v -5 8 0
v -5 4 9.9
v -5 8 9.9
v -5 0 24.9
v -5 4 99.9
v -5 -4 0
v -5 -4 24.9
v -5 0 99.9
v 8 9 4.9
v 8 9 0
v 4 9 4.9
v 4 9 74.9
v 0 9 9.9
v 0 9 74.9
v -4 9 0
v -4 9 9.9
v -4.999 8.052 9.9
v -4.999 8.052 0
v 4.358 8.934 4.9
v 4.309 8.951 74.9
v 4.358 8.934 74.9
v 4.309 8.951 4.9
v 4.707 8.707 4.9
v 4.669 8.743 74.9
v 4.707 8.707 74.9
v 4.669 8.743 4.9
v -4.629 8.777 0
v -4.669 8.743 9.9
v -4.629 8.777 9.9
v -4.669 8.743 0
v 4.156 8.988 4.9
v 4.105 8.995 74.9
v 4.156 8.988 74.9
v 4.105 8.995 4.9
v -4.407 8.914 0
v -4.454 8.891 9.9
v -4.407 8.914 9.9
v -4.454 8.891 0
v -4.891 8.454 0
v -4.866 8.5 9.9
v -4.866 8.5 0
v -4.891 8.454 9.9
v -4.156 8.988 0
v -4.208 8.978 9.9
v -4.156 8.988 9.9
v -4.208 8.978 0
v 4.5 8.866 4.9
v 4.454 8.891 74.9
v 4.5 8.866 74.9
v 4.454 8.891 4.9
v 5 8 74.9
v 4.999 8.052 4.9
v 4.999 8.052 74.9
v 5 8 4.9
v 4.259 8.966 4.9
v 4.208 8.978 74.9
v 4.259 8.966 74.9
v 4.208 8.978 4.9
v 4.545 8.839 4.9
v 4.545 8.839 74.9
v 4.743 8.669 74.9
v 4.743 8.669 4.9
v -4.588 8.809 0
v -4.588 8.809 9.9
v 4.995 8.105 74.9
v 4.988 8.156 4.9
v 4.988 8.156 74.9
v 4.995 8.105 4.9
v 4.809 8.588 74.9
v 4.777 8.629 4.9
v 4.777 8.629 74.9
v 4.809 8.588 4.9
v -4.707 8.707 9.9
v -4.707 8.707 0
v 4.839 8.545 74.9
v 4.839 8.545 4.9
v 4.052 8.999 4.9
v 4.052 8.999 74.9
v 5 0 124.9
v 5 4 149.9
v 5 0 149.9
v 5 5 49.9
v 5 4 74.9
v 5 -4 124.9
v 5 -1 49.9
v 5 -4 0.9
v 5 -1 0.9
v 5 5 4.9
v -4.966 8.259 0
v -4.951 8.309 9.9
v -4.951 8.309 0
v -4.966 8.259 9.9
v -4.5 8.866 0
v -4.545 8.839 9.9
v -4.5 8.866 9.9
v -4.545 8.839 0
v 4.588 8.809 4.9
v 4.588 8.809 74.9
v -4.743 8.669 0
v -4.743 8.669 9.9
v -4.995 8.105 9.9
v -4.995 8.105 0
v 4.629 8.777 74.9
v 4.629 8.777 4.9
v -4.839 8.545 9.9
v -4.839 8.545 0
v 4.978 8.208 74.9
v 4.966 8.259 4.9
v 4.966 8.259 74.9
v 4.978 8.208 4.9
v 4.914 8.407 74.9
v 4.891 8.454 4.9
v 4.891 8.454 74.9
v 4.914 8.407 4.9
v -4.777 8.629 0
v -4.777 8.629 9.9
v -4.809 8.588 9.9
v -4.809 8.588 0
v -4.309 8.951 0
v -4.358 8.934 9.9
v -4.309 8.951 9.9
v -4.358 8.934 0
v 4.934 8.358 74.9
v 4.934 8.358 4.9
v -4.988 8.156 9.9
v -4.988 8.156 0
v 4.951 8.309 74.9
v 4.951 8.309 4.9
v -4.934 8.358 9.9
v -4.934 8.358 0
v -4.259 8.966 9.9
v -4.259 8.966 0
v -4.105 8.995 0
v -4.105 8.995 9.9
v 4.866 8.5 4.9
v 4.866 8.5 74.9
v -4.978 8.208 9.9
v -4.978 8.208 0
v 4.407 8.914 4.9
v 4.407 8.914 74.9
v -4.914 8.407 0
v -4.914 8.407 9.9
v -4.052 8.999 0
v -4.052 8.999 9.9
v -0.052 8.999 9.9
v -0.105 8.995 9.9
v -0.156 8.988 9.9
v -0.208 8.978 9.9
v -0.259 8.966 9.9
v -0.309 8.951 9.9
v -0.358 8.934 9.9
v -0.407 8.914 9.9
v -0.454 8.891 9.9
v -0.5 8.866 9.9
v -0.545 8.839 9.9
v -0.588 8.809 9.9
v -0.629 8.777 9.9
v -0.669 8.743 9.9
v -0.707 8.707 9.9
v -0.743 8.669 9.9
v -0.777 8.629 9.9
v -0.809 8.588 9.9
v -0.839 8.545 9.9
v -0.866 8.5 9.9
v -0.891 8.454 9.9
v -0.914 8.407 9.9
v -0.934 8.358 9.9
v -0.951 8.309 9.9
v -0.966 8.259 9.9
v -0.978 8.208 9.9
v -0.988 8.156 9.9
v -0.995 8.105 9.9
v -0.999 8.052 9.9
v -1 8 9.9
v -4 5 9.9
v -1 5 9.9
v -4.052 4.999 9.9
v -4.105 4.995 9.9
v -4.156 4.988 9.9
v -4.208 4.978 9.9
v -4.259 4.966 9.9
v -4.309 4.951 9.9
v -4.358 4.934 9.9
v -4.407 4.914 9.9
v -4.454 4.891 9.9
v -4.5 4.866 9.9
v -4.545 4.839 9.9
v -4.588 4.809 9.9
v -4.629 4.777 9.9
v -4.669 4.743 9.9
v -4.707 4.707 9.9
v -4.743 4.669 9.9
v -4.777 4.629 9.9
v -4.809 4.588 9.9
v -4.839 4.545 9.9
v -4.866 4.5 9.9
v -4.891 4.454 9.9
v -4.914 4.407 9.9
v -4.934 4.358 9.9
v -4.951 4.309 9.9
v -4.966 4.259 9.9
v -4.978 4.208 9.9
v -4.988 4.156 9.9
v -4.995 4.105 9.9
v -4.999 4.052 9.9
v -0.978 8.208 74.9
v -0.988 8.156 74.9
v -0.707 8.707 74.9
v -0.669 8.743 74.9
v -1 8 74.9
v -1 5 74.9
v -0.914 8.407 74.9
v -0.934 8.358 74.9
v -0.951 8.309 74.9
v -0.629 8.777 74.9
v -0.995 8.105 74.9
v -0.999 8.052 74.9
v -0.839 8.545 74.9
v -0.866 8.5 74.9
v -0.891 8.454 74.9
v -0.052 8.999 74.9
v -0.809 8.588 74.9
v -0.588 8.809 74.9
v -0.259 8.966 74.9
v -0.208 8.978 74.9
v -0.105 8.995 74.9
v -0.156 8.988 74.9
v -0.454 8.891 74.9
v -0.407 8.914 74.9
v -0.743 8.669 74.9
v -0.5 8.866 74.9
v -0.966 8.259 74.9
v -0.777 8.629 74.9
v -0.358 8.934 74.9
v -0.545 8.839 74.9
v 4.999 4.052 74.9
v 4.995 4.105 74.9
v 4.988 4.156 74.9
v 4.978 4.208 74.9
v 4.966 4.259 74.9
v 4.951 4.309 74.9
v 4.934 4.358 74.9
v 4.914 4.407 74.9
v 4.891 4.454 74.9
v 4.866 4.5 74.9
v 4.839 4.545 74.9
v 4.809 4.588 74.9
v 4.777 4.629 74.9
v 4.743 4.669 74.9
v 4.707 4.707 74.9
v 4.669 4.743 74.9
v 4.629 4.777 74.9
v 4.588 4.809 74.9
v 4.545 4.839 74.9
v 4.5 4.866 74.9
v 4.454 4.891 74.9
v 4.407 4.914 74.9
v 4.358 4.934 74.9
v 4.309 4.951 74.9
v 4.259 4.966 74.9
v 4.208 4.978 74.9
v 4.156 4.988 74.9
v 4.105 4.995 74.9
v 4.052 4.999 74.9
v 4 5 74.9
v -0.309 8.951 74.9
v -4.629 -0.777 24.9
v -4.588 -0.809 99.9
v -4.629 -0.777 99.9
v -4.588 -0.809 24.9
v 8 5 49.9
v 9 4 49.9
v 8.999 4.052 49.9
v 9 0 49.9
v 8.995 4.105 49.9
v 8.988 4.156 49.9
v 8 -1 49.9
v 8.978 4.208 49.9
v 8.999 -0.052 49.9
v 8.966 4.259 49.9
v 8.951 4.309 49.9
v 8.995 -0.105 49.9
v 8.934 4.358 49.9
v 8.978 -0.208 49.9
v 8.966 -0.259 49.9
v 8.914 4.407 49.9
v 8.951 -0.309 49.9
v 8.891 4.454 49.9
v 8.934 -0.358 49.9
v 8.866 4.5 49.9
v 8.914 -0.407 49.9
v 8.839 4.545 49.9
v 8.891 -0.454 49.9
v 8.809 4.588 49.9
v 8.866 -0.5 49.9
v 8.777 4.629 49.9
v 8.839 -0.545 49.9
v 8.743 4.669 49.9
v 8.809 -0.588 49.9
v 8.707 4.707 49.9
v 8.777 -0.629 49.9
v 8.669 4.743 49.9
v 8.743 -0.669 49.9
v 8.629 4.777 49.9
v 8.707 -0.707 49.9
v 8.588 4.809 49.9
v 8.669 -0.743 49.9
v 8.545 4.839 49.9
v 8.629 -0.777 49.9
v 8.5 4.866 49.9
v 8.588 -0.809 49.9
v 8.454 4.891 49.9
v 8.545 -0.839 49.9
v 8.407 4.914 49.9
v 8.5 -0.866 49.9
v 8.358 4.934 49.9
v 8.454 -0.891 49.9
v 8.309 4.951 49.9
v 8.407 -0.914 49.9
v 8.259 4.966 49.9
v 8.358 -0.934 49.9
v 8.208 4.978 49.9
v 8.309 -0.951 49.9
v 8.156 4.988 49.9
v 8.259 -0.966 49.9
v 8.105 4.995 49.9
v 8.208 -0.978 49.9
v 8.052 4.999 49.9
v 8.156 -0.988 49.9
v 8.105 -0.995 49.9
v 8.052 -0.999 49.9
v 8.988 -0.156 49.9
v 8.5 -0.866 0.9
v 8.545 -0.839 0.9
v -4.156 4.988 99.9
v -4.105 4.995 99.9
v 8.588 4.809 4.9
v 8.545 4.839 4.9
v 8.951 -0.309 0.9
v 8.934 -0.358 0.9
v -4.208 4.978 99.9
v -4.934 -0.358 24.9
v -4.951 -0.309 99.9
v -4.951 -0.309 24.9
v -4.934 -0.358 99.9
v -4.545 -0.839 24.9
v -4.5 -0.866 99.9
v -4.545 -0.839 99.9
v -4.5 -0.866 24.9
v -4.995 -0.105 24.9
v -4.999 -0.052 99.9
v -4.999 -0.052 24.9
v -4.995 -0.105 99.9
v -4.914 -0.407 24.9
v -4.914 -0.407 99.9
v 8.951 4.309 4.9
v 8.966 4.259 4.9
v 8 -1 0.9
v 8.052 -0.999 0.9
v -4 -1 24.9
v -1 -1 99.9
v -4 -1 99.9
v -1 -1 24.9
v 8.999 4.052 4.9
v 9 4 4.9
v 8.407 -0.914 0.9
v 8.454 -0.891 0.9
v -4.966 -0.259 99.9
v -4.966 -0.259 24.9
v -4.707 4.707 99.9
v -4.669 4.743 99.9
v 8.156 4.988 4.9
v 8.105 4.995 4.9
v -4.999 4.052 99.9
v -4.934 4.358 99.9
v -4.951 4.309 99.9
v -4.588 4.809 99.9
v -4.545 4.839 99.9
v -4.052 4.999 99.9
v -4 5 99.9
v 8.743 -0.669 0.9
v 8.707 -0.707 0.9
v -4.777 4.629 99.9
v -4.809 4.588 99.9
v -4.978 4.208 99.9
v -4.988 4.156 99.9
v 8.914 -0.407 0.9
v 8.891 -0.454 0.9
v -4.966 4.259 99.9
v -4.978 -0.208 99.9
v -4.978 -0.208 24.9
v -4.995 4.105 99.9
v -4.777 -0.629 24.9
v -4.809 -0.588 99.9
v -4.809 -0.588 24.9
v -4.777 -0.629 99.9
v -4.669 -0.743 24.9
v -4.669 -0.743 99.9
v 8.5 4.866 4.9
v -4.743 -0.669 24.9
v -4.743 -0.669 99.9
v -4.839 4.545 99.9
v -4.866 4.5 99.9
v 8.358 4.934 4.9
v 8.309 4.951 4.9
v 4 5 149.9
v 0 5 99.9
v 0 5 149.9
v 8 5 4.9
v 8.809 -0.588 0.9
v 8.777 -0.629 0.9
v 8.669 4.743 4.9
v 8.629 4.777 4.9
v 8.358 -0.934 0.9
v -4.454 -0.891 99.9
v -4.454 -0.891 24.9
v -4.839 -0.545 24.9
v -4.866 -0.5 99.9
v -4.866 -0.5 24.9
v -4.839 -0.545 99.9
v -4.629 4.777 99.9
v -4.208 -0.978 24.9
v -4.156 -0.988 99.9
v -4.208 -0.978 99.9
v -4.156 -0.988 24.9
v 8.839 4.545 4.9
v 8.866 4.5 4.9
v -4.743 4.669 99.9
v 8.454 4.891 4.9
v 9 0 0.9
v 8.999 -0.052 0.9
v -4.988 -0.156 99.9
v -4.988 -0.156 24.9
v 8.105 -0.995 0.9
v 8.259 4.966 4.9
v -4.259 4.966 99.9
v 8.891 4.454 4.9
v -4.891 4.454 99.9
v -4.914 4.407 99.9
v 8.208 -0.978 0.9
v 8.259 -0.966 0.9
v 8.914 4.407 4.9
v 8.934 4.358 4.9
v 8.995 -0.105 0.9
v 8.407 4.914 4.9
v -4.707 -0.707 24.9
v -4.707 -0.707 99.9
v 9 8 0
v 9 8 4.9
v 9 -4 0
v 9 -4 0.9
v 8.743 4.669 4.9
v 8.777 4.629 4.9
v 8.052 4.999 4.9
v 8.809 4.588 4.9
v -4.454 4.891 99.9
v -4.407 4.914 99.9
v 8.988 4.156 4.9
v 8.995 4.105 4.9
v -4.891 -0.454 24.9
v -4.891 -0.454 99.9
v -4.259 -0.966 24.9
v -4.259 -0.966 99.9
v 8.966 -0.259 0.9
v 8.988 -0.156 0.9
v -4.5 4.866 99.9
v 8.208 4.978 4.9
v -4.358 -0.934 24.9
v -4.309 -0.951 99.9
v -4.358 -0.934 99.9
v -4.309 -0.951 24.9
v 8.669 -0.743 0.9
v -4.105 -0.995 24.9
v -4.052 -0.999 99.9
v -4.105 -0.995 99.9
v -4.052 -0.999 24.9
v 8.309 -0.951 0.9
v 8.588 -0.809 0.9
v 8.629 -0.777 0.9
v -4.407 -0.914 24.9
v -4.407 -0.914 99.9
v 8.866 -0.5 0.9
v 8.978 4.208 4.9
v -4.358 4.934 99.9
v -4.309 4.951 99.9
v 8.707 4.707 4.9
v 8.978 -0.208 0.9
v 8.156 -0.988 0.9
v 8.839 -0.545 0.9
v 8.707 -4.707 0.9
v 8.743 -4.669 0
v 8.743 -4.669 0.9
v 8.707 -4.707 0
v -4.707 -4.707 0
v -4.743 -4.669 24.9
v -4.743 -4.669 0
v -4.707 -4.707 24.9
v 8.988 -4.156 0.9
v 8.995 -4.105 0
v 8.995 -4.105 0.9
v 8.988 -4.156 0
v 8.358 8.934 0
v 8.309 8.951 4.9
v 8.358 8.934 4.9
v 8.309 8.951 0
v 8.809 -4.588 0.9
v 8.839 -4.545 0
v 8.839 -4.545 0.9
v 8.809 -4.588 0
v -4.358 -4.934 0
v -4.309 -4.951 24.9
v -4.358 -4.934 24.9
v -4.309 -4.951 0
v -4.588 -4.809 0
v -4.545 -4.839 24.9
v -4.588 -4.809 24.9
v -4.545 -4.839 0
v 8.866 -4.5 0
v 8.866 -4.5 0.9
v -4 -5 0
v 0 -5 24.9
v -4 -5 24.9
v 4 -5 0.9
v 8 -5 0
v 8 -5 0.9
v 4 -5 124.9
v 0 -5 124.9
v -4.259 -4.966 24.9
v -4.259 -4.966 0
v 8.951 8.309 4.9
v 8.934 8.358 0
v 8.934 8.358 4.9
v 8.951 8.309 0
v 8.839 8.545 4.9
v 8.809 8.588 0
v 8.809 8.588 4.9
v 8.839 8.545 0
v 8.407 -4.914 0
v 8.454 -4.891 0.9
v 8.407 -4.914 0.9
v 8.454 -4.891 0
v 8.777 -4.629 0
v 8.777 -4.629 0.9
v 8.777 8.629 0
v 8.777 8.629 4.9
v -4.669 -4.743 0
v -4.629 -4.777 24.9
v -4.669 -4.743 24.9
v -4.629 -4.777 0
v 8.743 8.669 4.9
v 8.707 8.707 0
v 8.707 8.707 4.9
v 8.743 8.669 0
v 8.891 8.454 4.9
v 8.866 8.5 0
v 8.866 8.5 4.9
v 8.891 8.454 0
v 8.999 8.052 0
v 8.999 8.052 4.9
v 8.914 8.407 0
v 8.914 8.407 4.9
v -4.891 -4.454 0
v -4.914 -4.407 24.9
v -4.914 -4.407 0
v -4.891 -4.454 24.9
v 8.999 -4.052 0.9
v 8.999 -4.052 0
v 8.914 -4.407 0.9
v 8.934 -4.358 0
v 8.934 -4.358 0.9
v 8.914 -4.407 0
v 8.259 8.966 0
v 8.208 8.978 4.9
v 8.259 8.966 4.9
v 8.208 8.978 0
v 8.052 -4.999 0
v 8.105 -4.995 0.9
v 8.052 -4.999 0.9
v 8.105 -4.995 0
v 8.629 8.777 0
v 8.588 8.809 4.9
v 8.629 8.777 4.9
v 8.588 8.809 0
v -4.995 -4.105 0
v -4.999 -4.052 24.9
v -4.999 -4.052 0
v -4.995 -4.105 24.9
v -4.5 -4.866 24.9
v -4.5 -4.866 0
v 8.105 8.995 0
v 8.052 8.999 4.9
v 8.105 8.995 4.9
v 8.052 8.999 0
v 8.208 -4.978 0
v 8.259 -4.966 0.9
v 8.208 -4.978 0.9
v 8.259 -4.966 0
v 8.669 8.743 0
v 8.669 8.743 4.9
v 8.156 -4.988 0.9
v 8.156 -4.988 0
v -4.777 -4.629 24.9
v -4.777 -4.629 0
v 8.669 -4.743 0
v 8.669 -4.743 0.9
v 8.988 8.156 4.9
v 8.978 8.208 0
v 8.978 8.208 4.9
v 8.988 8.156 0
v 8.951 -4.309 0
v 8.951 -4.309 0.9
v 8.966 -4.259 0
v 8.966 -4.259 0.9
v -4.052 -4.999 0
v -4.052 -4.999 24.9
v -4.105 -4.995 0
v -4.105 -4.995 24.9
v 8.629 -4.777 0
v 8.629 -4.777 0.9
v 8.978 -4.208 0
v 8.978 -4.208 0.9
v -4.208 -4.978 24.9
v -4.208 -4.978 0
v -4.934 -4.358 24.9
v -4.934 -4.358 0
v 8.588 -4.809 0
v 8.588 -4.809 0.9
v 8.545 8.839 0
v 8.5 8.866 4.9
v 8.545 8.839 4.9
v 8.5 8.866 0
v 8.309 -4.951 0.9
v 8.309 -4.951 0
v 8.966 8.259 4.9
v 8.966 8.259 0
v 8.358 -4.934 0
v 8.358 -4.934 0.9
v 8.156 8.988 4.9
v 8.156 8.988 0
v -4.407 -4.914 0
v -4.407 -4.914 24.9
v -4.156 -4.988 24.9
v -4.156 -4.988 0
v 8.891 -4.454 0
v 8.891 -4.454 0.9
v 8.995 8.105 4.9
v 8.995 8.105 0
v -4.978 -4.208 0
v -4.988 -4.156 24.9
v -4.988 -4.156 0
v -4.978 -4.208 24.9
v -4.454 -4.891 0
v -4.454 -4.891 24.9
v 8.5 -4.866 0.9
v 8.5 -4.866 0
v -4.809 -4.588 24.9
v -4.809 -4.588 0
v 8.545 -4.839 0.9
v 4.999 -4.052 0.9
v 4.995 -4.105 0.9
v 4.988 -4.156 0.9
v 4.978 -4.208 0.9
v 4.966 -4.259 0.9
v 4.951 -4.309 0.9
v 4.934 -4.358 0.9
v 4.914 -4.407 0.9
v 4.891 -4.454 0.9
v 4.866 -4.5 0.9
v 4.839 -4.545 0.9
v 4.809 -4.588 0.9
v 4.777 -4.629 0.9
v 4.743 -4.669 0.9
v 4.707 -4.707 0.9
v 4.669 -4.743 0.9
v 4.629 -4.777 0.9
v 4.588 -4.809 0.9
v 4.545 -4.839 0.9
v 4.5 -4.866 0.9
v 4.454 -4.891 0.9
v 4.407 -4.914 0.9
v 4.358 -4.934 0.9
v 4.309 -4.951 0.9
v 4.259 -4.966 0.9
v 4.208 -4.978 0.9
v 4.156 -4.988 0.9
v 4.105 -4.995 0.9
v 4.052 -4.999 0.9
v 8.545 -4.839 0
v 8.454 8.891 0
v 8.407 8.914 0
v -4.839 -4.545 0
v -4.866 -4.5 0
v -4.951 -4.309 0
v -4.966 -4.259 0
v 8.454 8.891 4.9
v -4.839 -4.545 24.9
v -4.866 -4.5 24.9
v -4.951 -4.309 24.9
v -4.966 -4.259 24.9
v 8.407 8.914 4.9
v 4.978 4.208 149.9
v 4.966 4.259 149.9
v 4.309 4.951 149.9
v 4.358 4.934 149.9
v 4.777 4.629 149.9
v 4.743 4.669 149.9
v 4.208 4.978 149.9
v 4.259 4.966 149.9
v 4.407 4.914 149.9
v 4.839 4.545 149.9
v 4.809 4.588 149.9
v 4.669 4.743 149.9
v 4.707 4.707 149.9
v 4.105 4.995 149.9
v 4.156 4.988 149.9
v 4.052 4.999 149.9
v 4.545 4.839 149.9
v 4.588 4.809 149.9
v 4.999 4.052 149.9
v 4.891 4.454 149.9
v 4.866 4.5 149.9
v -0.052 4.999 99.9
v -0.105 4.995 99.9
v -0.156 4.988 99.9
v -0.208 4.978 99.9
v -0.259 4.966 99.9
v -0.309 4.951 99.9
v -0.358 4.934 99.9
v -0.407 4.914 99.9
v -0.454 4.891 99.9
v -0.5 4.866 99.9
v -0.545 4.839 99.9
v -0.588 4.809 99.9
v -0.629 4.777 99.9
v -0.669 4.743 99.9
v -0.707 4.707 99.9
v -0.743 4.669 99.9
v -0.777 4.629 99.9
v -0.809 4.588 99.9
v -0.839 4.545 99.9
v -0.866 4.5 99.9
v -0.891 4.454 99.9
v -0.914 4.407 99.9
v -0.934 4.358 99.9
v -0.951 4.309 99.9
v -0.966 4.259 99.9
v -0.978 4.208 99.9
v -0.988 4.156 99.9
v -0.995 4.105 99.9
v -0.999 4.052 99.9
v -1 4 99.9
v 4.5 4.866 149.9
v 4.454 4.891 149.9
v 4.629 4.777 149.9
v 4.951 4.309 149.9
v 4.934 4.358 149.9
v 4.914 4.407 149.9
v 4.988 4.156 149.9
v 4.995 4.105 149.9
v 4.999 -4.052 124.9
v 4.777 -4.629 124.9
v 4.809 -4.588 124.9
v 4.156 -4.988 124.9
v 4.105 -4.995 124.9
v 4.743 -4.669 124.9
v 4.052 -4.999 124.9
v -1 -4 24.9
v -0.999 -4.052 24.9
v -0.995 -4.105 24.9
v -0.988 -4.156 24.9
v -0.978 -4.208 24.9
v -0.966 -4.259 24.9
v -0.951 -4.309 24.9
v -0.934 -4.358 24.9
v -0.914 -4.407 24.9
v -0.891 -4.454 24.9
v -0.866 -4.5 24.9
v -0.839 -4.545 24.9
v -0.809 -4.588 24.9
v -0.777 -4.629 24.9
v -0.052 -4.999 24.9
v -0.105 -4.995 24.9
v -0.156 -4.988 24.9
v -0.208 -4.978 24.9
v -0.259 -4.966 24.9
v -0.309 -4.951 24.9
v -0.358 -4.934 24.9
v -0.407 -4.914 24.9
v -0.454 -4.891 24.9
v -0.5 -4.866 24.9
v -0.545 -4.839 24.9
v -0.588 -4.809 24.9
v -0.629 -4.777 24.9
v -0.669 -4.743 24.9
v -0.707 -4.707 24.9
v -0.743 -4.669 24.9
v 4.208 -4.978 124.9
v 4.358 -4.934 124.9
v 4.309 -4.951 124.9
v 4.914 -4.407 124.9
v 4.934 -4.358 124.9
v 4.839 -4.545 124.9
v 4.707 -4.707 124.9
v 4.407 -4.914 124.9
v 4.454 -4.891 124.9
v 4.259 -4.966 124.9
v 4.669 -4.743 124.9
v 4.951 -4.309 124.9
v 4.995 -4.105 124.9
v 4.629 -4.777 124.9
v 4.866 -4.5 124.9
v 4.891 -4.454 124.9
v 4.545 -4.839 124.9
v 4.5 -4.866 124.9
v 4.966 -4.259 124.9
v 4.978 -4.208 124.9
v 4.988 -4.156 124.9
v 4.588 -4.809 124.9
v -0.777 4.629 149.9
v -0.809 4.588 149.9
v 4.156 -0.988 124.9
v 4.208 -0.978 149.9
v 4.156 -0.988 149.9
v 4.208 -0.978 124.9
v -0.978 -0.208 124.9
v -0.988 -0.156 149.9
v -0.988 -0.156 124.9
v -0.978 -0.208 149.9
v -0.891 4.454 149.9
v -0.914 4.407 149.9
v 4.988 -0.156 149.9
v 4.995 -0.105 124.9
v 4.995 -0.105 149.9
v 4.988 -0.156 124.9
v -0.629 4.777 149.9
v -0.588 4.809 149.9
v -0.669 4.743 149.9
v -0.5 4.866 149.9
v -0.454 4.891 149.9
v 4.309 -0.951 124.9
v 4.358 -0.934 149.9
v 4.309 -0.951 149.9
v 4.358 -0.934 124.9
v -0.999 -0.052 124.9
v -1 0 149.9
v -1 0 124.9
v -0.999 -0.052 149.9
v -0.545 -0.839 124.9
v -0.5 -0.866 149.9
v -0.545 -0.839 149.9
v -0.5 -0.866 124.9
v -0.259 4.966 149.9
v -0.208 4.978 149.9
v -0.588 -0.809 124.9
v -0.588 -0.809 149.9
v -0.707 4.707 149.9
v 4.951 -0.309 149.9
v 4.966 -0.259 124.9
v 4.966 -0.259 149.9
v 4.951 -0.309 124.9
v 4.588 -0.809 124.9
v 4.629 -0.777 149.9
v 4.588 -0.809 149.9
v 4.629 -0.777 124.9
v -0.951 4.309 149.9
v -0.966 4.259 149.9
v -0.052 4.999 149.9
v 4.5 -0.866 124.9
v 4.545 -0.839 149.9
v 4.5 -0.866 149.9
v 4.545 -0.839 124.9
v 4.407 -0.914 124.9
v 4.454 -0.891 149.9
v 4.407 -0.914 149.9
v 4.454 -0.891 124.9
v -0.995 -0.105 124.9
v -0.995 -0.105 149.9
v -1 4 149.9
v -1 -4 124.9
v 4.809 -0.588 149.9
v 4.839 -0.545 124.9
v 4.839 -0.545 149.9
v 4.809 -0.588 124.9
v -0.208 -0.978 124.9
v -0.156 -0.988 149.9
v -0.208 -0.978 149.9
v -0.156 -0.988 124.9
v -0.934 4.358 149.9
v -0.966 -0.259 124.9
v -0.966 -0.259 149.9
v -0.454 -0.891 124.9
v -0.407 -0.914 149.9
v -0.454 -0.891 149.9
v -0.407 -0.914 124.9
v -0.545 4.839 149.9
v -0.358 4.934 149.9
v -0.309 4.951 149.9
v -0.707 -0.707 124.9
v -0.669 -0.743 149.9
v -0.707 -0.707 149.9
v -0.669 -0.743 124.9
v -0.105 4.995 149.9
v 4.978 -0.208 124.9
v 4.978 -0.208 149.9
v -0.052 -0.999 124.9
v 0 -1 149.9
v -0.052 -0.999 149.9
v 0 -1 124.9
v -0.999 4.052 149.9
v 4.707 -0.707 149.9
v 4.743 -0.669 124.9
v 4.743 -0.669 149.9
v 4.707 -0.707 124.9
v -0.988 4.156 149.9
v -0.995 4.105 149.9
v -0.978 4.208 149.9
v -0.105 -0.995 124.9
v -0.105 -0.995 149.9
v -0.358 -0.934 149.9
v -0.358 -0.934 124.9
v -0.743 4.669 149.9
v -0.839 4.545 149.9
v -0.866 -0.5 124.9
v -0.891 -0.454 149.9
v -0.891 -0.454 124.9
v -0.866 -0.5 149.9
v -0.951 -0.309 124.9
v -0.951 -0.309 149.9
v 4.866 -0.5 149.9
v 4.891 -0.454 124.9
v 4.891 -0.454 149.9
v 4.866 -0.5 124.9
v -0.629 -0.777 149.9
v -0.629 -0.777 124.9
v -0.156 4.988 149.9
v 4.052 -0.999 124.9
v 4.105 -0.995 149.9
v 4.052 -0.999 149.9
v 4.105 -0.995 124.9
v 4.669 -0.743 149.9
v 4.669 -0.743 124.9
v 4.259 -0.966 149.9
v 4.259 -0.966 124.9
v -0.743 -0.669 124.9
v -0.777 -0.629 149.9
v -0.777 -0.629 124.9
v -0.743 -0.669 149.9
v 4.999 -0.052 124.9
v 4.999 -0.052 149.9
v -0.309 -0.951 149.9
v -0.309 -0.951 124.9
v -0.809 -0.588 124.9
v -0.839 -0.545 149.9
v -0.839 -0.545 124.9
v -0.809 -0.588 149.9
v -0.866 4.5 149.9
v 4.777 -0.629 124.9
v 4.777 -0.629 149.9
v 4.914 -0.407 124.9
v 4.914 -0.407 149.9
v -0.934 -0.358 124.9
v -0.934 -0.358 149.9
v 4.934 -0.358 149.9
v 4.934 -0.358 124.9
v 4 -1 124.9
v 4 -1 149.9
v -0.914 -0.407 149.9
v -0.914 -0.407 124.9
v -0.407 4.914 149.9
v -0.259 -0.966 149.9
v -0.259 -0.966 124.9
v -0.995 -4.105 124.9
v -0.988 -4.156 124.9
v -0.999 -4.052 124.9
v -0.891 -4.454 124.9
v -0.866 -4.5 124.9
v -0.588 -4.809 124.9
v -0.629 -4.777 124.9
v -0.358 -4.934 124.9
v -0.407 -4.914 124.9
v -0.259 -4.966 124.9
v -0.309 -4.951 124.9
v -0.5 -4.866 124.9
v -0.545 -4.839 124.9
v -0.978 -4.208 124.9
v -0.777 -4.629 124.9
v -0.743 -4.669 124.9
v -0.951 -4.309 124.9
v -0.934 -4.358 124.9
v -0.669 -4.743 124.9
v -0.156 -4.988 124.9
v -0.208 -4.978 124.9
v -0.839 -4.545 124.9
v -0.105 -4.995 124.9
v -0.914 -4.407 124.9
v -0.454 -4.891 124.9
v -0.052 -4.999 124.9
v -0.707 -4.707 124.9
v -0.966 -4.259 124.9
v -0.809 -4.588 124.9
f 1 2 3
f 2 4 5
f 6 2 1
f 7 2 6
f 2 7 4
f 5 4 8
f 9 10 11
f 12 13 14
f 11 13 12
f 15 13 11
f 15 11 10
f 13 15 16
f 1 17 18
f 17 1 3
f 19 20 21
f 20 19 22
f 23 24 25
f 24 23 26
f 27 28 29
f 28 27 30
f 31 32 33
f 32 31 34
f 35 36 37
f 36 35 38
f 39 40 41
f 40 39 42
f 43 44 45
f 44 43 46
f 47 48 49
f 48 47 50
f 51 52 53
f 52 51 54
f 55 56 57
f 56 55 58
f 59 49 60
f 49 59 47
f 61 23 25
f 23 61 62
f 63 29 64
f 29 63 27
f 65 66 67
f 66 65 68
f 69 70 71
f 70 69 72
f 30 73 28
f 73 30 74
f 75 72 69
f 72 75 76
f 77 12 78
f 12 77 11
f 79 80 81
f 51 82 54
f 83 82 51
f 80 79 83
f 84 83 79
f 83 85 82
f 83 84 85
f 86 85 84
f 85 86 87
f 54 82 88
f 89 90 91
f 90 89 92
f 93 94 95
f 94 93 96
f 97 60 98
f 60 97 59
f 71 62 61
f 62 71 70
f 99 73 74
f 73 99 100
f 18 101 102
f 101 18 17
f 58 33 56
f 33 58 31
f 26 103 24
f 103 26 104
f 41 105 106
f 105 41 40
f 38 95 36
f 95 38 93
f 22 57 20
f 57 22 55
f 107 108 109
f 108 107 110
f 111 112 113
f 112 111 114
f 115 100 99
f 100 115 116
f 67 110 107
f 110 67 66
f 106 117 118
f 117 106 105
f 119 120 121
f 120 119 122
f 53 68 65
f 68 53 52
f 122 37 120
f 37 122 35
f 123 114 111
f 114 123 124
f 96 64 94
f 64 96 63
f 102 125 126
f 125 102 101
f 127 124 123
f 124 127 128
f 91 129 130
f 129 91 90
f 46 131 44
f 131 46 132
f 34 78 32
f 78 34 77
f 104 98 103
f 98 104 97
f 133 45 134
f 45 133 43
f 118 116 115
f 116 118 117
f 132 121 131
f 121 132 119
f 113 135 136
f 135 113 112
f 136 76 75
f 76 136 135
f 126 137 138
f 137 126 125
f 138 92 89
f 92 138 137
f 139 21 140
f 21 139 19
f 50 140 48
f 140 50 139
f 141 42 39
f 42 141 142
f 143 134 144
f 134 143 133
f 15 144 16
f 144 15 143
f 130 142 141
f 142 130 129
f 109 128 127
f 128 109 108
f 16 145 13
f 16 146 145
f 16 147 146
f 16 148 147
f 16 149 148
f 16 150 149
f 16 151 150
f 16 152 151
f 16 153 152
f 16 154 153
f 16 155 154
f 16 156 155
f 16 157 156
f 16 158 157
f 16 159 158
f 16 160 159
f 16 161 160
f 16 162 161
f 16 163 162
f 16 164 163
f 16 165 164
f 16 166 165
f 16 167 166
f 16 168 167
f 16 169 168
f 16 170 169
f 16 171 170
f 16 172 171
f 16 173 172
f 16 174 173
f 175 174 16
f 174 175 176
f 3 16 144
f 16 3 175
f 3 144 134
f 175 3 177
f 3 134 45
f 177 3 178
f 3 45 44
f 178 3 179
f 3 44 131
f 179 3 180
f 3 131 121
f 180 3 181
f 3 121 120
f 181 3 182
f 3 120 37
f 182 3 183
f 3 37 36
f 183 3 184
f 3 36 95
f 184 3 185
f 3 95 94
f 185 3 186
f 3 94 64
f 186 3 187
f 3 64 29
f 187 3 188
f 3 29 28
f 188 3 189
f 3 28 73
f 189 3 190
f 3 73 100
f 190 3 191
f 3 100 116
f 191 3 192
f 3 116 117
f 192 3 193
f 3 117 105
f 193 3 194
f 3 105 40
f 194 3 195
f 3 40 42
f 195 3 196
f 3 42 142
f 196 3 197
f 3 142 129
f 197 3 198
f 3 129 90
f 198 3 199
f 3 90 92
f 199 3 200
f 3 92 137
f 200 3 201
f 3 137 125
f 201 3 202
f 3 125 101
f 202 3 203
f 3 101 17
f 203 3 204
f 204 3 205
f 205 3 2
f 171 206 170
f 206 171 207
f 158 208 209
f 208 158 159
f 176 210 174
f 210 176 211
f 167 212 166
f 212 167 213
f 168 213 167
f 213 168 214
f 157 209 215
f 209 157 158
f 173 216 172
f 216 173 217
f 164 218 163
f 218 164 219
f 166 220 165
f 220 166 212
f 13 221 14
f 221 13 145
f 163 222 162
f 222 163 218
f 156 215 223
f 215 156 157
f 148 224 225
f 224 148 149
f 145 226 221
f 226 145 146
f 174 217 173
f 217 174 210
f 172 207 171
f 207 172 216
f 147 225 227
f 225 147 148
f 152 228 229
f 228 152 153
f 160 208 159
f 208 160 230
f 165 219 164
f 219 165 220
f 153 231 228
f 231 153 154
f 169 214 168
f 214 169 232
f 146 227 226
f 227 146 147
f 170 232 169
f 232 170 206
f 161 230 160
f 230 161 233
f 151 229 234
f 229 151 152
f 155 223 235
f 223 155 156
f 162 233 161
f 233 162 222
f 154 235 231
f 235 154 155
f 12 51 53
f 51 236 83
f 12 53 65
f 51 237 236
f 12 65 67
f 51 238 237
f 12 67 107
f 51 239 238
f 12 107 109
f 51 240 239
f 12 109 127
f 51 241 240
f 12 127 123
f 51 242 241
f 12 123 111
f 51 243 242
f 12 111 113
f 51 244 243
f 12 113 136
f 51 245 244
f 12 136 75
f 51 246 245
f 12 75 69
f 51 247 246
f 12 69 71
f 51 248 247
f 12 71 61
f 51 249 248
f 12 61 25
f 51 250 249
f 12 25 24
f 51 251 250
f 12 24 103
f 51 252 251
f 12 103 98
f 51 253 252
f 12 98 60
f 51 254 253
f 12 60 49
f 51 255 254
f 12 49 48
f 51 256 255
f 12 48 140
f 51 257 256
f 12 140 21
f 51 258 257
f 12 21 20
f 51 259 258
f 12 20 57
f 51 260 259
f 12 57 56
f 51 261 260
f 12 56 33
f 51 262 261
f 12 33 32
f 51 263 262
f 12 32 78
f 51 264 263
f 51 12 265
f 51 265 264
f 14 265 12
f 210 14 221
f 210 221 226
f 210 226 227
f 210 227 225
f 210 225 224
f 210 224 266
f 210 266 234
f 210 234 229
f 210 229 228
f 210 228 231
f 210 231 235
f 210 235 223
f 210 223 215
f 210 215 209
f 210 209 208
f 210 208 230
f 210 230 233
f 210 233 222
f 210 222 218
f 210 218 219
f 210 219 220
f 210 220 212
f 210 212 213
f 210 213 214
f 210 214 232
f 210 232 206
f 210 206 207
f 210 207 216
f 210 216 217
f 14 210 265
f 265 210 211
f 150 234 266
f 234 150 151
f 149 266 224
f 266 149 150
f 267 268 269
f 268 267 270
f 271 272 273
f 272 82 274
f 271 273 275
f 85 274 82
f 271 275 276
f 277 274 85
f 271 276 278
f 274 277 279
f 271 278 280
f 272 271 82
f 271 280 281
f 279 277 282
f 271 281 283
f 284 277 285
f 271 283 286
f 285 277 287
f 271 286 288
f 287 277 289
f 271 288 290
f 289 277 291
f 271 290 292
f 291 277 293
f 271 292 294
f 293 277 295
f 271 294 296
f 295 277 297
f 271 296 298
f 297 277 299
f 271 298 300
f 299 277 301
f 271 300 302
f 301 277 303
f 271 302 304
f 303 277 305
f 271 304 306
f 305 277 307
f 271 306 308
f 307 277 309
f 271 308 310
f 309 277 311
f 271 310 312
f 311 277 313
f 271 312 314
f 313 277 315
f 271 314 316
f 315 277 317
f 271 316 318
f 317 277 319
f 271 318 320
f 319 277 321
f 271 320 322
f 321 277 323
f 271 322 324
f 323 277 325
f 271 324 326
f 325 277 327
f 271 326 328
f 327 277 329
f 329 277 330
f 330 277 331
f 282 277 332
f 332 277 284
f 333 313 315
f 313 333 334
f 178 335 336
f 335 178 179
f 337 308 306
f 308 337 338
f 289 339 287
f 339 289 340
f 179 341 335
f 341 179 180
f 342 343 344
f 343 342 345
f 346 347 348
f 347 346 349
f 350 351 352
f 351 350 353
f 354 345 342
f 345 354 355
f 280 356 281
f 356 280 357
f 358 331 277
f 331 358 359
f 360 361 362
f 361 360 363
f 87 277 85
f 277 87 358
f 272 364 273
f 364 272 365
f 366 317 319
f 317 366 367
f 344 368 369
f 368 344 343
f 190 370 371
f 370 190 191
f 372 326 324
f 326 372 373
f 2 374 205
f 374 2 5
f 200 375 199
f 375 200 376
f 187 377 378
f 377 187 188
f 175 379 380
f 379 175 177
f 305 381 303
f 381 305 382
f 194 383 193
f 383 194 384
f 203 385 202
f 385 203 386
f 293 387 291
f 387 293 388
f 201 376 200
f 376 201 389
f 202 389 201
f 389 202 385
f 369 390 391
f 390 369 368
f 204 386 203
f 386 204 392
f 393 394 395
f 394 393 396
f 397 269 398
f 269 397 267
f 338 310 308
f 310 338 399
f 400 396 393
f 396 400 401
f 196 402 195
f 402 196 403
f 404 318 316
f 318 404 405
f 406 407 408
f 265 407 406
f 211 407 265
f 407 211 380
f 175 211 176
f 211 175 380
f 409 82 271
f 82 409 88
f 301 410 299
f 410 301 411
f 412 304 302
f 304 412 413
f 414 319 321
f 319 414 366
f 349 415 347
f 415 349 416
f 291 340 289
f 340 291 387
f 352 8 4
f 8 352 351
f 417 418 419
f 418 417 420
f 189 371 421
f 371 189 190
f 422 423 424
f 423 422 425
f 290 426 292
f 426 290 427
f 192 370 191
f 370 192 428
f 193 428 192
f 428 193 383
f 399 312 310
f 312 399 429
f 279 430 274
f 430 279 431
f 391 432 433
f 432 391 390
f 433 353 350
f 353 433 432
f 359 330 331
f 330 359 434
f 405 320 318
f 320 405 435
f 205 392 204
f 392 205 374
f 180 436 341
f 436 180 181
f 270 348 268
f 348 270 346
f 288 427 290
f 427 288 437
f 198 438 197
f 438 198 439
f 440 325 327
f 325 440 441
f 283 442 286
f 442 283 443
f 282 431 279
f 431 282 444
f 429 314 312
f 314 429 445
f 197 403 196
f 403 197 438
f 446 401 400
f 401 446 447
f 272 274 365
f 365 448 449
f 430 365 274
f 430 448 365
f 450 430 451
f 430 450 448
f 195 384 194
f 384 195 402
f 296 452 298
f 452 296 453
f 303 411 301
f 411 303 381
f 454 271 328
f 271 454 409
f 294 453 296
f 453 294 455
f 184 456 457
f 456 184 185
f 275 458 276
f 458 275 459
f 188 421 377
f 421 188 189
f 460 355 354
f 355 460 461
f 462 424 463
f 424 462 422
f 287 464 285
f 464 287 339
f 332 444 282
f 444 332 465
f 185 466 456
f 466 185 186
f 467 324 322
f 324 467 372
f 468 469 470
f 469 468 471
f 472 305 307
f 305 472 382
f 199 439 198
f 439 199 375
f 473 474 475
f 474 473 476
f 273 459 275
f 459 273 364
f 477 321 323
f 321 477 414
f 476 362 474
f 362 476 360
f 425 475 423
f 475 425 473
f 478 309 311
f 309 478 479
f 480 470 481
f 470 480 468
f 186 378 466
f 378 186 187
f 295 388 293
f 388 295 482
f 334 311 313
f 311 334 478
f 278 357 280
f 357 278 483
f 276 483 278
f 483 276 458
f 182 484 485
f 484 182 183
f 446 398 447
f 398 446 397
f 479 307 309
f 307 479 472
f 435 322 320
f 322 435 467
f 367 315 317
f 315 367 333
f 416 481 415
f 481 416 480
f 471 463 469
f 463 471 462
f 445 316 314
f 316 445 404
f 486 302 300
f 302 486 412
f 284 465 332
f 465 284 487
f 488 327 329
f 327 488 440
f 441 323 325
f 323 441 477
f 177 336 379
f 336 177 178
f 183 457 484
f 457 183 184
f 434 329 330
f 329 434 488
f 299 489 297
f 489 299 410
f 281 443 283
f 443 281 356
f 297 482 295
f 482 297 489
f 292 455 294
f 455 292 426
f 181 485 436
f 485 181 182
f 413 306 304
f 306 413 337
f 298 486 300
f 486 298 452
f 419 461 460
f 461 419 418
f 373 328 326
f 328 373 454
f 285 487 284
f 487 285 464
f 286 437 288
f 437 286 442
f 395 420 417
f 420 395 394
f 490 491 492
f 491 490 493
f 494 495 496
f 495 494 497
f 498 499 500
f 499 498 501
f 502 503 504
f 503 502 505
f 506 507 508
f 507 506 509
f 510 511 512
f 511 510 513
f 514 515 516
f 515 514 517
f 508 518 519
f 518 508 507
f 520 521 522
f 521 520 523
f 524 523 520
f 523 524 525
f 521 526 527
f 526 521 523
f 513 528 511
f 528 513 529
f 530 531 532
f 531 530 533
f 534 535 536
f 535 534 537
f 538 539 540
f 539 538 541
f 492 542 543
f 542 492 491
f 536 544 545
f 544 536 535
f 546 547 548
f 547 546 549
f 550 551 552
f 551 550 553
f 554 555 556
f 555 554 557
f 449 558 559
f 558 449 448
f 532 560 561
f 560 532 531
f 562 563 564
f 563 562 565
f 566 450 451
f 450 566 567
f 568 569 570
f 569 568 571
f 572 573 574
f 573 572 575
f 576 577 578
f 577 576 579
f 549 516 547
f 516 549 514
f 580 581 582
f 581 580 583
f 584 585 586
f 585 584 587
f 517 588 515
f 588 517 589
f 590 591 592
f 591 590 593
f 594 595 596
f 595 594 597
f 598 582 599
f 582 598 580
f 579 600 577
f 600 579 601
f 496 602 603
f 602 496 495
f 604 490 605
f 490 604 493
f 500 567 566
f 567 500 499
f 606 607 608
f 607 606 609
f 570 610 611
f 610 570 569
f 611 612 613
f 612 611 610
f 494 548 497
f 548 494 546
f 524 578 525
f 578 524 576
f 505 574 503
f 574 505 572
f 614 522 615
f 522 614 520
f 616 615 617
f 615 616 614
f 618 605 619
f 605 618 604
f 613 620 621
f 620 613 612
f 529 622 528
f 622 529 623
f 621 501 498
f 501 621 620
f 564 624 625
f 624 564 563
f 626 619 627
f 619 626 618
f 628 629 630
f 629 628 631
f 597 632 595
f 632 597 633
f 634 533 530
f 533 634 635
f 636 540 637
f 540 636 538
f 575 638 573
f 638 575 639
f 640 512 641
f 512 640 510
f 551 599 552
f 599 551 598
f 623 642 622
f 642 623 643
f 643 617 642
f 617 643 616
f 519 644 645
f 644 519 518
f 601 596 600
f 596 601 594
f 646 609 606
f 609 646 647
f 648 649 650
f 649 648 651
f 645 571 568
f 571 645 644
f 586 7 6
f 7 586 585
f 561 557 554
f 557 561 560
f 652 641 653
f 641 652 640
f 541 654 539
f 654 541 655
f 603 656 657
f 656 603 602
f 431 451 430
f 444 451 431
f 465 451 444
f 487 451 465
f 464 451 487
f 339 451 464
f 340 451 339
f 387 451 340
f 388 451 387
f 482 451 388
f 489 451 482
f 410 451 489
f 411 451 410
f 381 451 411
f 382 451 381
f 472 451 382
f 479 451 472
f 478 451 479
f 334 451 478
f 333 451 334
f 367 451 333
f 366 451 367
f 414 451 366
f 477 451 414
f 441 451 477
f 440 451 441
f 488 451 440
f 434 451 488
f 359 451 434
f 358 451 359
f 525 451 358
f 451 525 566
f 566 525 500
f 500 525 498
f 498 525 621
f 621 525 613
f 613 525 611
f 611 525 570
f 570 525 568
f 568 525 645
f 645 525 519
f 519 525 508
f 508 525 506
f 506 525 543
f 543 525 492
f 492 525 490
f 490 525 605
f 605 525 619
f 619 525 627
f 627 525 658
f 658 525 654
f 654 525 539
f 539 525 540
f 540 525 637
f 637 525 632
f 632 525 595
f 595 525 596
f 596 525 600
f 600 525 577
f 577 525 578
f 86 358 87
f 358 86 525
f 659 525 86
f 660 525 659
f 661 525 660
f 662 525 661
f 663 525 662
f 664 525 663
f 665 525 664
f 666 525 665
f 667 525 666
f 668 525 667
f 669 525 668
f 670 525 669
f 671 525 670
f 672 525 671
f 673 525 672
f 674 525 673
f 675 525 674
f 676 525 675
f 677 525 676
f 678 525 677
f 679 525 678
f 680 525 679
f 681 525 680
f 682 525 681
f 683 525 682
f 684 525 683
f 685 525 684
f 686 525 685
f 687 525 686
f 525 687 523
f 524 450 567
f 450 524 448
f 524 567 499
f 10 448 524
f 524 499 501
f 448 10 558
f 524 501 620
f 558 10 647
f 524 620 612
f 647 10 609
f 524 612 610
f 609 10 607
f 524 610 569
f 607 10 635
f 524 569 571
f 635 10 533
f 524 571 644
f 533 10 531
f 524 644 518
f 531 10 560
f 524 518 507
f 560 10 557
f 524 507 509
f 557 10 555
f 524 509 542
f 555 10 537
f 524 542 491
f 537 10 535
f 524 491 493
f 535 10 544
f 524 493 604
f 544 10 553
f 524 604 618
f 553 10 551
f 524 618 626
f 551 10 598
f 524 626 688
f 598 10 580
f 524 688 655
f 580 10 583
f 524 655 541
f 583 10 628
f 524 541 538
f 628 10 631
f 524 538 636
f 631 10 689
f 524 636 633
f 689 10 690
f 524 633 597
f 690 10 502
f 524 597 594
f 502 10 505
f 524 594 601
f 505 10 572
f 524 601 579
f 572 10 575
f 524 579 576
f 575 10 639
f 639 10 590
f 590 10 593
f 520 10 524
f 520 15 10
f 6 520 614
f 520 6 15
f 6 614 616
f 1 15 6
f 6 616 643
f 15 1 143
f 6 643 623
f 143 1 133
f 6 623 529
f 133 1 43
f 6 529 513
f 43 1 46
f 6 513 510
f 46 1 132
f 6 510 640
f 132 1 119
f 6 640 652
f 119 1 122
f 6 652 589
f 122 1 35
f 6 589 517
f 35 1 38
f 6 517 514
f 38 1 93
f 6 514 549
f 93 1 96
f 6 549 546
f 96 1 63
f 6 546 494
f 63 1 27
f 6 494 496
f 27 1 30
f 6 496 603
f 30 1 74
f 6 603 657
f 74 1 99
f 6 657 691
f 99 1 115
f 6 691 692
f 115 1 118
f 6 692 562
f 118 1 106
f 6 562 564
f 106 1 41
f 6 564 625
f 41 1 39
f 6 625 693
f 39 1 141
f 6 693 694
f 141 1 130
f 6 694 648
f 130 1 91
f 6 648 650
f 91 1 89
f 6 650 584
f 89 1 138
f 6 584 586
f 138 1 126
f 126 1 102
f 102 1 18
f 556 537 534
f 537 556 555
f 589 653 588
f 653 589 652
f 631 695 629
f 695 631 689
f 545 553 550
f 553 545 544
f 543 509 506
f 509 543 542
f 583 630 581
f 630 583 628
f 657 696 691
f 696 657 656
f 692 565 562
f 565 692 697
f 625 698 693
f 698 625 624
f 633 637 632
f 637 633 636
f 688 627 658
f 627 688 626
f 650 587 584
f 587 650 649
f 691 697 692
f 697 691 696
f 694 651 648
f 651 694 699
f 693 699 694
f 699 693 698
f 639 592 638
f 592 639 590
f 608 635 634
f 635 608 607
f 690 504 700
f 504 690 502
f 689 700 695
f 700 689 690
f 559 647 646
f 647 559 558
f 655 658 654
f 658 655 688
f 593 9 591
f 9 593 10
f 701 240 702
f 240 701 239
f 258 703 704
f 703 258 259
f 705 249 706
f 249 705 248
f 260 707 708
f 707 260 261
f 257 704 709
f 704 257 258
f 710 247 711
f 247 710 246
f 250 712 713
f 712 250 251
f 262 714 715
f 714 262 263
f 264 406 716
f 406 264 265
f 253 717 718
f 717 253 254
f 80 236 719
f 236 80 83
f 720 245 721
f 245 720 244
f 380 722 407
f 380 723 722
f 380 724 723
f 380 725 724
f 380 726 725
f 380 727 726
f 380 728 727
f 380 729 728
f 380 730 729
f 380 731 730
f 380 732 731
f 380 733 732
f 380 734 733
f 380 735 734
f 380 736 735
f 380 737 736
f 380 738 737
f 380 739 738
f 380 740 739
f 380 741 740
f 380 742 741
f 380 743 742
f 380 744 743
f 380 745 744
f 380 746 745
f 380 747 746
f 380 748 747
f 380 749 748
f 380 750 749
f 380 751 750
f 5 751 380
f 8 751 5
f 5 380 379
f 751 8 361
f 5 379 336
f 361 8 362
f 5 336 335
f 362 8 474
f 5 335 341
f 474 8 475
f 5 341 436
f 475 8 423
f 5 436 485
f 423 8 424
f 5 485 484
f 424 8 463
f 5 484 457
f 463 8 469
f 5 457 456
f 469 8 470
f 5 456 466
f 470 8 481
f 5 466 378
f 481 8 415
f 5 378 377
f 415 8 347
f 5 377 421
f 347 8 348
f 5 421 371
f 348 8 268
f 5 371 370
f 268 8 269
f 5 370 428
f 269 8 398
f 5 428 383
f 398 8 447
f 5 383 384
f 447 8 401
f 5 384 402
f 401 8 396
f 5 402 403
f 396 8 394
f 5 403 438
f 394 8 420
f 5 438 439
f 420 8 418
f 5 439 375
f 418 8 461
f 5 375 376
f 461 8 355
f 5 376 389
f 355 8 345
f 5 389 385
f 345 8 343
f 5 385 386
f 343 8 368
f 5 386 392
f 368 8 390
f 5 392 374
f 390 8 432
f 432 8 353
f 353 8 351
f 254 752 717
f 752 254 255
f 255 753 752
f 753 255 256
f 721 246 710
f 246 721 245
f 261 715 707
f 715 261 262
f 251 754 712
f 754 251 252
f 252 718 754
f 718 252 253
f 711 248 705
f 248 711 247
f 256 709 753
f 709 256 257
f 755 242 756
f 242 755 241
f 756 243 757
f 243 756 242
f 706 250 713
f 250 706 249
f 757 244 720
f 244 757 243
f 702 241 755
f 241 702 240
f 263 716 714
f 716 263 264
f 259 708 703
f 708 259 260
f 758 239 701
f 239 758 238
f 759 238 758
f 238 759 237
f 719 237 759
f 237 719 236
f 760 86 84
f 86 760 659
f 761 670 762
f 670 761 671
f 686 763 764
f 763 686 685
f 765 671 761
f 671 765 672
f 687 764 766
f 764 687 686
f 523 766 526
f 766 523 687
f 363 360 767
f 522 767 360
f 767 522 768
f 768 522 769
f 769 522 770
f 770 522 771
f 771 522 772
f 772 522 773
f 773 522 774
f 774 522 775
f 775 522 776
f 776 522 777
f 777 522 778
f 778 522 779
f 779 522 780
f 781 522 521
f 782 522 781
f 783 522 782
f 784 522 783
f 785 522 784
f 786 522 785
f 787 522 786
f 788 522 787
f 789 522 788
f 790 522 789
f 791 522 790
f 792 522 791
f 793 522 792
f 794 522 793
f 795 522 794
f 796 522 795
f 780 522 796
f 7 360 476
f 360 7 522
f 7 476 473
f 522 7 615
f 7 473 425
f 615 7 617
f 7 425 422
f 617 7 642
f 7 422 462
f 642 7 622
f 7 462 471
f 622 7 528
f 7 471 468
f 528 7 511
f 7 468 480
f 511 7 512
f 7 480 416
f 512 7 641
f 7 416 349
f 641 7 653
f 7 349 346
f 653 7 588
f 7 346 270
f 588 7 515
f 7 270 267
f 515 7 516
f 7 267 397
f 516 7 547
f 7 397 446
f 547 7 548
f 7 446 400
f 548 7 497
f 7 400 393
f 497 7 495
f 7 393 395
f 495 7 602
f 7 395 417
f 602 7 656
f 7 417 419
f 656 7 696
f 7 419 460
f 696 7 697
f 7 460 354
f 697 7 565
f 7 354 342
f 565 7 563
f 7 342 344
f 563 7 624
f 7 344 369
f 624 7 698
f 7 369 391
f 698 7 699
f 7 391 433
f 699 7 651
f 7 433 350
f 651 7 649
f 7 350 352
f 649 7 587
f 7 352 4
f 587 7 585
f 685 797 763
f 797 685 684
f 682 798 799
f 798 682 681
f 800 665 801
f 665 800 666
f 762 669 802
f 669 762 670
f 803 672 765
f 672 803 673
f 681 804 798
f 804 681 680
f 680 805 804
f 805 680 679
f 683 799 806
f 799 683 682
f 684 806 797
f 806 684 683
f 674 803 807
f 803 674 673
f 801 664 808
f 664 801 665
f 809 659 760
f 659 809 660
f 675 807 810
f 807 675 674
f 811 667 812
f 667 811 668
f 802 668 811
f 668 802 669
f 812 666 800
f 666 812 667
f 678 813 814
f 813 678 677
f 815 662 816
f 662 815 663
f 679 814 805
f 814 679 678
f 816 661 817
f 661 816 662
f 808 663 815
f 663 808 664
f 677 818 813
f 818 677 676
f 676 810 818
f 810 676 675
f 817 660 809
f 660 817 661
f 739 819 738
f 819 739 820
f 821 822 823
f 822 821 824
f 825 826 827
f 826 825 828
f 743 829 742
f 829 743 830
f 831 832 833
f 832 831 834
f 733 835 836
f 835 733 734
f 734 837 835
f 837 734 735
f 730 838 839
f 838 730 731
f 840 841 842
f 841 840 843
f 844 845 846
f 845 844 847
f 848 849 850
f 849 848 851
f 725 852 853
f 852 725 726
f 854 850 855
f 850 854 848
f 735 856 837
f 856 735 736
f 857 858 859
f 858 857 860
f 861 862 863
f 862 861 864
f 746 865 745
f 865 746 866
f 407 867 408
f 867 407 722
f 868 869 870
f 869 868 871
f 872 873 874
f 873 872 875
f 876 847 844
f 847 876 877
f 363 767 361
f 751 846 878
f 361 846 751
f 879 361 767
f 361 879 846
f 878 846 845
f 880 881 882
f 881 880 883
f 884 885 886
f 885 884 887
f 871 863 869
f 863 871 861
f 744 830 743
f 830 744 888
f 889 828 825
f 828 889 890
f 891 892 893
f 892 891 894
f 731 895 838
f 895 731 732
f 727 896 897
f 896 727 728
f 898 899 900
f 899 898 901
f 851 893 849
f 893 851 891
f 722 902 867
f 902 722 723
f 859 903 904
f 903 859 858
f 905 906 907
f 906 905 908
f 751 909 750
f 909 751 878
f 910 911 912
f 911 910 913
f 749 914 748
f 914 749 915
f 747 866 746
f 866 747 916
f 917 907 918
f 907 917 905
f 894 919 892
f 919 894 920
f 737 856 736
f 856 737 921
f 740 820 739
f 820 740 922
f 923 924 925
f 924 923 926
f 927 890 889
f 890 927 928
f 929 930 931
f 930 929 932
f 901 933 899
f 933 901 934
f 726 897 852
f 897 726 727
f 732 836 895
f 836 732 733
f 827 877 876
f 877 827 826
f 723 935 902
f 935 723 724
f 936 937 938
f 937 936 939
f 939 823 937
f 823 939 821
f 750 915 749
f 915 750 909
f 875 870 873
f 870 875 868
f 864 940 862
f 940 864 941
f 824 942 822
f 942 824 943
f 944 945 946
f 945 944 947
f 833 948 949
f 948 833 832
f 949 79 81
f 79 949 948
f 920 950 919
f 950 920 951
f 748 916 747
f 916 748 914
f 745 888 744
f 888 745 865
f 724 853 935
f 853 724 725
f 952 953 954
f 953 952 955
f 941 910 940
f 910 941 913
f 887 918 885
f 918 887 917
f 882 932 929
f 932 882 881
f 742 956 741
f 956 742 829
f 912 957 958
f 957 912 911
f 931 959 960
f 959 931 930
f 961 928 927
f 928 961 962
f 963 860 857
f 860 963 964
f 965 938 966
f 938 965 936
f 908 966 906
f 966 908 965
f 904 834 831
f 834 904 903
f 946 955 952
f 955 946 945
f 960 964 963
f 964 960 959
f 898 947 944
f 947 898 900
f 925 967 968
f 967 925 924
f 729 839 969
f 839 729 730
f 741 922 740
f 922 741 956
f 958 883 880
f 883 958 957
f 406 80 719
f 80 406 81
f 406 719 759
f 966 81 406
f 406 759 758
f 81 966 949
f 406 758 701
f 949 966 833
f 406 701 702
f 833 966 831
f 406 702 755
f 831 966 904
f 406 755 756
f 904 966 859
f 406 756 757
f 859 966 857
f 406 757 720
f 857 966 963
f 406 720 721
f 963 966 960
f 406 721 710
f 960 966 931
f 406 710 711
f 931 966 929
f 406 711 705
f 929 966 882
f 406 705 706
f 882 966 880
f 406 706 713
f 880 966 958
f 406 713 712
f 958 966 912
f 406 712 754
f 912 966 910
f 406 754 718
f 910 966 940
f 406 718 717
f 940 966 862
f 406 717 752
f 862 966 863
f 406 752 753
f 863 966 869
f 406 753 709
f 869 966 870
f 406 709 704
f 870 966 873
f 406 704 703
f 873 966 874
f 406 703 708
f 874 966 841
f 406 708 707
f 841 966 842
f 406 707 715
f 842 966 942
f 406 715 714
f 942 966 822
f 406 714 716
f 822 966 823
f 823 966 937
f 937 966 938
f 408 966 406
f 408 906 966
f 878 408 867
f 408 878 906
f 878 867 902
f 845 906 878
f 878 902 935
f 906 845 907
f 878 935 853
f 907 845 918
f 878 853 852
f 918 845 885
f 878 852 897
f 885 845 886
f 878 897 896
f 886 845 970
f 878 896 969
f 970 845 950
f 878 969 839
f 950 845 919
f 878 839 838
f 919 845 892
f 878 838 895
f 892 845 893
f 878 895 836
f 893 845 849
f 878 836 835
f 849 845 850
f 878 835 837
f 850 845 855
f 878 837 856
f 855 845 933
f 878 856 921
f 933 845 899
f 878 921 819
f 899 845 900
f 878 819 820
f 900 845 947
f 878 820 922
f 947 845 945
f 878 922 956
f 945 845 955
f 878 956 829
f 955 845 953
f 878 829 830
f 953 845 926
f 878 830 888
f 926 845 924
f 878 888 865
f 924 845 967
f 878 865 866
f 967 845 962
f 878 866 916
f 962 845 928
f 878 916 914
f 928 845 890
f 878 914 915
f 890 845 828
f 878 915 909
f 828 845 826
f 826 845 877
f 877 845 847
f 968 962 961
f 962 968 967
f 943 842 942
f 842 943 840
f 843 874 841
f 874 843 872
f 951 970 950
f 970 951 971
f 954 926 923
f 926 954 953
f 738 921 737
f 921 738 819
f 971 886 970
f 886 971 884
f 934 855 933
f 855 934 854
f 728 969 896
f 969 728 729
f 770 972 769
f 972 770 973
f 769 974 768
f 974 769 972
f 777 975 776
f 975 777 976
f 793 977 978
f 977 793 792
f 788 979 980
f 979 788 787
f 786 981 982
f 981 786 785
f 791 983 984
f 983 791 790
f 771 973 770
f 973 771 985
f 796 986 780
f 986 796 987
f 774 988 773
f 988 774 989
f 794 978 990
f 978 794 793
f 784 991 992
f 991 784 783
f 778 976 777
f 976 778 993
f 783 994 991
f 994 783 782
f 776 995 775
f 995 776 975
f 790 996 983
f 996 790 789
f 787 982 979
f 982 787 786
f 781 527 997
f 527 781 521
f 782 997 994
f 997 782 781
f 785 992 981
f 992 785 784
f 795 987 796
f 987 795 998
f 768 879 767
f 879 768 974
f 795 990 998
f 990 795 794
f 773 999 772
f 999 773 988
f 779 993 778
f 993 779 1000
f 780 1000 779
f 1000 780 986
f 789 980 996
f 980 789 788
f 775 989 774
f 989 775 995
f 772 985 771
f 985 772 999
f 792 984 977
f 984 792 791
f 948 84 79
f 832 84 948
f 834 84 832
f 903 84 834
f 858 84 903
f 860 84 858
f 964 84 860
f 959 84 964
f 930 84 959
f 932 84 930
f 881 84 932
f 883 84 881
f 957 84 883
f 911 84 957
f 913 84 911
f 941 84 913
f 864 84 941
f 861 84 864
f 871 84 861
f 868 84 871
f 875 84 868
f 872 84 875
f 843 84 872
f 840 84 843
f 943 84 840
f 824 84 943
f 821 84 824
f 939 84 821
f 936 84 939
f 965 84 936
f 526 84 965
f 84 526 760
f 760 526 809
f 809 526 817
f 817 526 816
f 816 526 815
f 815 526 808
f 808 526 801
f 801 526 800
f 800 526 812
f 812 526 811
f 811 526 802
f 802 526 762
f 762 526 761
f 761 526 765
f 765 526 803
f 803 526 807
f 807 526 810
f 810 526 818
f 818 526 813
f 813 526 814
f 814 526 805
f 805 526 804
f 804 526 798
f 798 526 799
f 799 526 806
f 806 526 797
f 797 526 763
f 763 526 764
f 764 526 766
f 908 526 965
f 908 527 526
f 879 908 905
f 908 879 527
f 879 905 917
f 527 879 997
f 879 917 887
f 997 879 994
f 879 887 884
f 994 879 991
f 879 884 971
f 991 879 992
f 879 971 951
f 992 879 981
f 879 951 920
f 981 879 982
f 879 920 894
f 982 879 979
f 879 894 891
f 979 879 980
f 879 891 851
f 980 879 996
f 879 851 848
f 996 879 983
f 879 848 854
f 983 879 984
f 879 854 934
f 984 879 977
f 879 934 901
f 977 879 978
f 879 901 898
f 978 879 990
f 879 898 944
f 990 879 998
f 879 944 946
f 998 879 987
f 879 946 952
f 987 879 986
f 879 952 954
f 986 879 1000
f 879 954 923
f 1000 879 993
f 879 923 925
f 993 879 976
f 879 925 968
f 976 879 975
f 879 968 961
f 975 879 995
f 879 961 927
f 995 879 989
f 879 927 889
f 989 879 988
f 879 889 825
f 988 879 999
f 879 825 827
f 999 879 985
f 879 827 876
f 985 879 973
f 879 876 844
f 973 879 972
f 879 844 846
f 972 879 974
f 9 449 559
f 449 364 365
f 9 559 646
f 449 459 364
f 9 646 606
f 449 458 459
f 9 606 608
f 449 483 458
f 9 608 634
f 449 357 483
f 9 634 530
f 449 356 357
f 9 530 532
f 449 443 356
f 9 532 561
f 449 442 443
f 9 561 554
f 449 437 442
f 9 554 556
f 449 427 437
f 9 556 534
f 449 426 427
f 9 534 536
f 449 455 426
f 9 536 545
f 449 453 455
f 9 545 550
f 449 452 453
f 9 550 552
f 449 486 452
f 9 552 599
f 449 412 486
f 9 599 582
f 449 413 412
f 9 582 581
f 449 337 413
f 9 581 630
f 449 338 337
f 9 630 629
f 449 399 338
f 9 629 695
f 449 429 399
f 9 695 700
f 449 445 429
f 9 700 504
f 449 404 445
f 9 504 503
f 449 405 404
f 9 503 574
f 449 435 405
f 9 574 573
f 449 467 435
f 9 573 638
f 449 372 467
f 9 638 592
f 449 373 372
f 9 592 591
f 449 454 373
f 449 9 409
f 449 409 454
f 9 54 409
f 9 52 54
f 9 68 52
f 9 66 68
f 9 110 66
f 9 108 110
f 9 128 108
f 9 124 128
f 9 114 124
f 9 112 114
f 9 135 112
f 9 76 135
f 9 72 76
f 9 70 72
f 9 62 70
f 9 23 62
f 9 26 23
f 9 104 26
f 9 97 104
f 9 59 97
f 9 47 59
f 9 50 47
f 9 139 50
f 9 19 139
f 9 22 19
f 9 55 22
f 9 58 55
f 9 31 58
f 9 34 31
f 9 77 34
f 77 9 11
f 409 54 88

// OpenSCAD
//------------------------------------------------------
// XY calibration test
// Simple Calibration Z Axis
// 5@xes 16/11/2021
//------------------------------------------------------

$fn = 120;

size = 4;
dec = 4;
minh = 0.1;

minkowski()
{
    union() {
    translate([dec,dec,0]) cube(size =[size,size,5-2*minh], center =false);
    translate([-dec,dec,0]) cube(size =[size,size,10-2*minh], center =false);
    translate([-dec,-dec,0]) cube(size =[size,size,25-2*minh], center =false);
    translate([dec,-dec,0]) cube(size =[size,size,1-2*minh], center =false);
    
    translate([0,dec,0]) cube(size =[size,size,75-2*minh], center =false);     
    translate([dec,0,0]) cube(size =[size,size,50-2*minh], center =false);    
    cube(size =[size,size,150-2*minh], center =false);
    translate([-dec,0,0]) cube(size =[size,size,100-2*minh], center =false); 
    translate([0,-dec,0]) cube(size =[size,size,125-2*minh], center =false);    
}
  cylinder(r=1,h=minh);
}


                
